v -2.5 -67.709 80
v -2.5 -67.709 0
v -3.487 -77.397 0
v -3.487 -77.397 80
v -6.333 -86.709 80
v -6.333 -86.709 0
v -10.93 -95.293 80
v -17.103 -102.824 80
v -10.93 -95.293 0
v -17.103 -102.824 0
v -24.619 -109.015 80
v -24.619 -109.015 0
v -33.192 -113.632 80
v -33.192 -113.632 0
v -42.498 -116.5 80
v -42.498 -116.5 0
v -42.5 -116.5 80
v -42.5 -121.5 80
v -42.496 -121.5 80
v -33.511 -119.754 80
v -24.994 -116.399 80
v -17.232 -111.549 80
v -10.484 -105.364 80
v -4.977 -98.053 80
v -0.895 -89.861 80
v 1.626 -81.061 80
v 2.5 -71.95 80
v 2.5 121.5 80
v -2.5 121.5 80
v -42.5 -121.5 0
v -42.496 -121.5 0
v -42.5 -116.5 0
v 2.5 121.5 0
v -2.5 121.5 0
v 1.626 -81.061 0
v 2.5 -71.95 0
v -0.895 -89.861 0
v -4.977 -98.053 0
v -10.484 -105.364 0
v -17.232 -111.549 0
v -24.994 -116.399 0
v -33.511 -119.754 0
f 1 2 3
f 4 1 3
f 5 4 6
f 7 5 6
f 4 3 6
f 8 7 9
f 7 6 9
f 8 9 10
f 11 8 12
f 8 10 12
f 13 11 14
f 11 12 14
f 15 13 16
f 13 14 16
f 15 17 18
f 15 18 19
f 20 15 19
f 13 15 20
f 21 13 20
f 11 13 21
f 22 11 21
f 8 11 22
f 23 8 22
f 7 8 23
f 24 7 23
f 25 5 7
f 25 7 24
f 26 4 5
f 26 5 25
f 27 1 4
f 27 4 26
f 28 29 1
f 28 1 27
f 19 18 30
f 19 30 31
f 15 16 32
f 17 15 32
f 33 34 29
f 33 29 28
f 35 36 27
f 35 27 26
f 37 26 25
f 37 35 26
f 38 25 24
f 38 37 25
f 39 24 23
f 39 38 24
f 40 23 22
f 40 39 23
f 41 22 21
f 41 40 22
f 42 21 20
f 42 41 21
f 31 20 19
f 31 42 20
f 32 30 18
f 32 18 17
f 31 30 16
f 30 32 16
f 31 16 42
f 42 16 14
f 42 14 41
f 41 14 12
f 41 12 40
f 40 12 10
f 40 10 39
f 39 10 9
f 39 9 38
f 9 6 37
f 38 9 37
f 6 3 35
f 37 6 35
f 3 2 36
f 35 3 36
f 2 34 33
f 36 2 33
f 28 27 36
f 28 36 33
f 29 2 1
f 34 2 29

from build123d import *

# Parameters (mm, degrees)
F0_W        = 5
F0_H        = 5
F0_W_2      = 40
F0_H_2      = 238
F1_DEPTH    = 80
F2_T4_DEPTH = 80
F2_T7_DEPTH = 328.751226723


# Not quite as in the source:
# - a fillet or chamfer that OpenCascade refuses, or shapes differently, is made with other operations: its cross-section is extruded or revolved along the edge and cut away or added


with BuildPart() as f1:
    # F0 (on Top) → F1 (new body)
    with BuildSketch(Plane.XY):
        with Locations((0, -119)):
            Rectangle(F0_W, F0_H)
        with Locations((-22.5, -119)):
            Rectangle(F0_W_2, F0_H)
        with Locations((0, 2.5)):
            Rectangle(F0_W, F0_H_2)
    extrude(amount=F1_DEPTH)

    # F2: fillet of radius 50 on 2 edges, made by hand


with BuildPart() as f2_tool2:
    # F2_s3 → F2_t4 (new body)
    with BuildSketch(Plane.XY):
        with BuildLine():
            ThreePointArc((-2.4996, -67.5094166718), (-13.7698250279, -99.1327516284), (-42.4999199938, -116.5003919171))
            Line((-42.4999199938, -116.5003919171), (-41.4998154247, -121.3994894416))
            ThreePointArc((-41.4998154247, -121.3994894416), (-22.4999599969, -121.5001365685), (-2.5, -121.5001365685))
            Line((-2.5, -121.5001365685), (2.5001365685, -116.5))
            ThreePointArc((2.5001365685, -116.5), (2.5001365685, -92.0047083359), (2.5005365685, -67.5094166718))
            Line((2.5005365685, -67.5094166718), (-2.4996, -67.5094166718))
        make_face()
    extrude(amount=F2_T4_DEPTH)

    split(bisect_by=Plane.YZ.offset(2.5), keep=Keep.BOTTOM)

    split(bisect_by=Plane.XZ.offset(121.5), keep=Keep.BOTTOM)


with BuildPart() as f1_1:
    add(f1.part)

    # F2_t1: union F2_tool2
    add(f2_tool2.part)

    # F2_s8 → F2_t7 (cut)
    with BuildSketch(Plane.XY.offset(-124.3756133615)):
        with BuildLine():
            ThreePointArc((2.5004, -71.749754657), (-10.4186674501, -105.2913665442), (-42.499959993, -121.5003979943))
            Line((-42.499959993, -121.5003979943), (-41.9998594238, -126.475462328))
            ThreePointArc((-41.9998594238, -126.475462328), (-19.9999799965, -126.5001365685), (2.5, -126.5001365685))
            Line((2.5, -126.5001365685), (7.5001365685, -121.5))
            ThreePointArc((7.5001365685, -121.5), (7.5001365685, -96.6248773285), (7.5005365685, -71.749754657))
            Line((7.5005365685, -71.749754657), (2.5004, -71.749754657))
        make_face()
    extrude(amount=F2_T7_DEPTH, mode=Mode.SUBTRACT)


solid = f1_1.part
